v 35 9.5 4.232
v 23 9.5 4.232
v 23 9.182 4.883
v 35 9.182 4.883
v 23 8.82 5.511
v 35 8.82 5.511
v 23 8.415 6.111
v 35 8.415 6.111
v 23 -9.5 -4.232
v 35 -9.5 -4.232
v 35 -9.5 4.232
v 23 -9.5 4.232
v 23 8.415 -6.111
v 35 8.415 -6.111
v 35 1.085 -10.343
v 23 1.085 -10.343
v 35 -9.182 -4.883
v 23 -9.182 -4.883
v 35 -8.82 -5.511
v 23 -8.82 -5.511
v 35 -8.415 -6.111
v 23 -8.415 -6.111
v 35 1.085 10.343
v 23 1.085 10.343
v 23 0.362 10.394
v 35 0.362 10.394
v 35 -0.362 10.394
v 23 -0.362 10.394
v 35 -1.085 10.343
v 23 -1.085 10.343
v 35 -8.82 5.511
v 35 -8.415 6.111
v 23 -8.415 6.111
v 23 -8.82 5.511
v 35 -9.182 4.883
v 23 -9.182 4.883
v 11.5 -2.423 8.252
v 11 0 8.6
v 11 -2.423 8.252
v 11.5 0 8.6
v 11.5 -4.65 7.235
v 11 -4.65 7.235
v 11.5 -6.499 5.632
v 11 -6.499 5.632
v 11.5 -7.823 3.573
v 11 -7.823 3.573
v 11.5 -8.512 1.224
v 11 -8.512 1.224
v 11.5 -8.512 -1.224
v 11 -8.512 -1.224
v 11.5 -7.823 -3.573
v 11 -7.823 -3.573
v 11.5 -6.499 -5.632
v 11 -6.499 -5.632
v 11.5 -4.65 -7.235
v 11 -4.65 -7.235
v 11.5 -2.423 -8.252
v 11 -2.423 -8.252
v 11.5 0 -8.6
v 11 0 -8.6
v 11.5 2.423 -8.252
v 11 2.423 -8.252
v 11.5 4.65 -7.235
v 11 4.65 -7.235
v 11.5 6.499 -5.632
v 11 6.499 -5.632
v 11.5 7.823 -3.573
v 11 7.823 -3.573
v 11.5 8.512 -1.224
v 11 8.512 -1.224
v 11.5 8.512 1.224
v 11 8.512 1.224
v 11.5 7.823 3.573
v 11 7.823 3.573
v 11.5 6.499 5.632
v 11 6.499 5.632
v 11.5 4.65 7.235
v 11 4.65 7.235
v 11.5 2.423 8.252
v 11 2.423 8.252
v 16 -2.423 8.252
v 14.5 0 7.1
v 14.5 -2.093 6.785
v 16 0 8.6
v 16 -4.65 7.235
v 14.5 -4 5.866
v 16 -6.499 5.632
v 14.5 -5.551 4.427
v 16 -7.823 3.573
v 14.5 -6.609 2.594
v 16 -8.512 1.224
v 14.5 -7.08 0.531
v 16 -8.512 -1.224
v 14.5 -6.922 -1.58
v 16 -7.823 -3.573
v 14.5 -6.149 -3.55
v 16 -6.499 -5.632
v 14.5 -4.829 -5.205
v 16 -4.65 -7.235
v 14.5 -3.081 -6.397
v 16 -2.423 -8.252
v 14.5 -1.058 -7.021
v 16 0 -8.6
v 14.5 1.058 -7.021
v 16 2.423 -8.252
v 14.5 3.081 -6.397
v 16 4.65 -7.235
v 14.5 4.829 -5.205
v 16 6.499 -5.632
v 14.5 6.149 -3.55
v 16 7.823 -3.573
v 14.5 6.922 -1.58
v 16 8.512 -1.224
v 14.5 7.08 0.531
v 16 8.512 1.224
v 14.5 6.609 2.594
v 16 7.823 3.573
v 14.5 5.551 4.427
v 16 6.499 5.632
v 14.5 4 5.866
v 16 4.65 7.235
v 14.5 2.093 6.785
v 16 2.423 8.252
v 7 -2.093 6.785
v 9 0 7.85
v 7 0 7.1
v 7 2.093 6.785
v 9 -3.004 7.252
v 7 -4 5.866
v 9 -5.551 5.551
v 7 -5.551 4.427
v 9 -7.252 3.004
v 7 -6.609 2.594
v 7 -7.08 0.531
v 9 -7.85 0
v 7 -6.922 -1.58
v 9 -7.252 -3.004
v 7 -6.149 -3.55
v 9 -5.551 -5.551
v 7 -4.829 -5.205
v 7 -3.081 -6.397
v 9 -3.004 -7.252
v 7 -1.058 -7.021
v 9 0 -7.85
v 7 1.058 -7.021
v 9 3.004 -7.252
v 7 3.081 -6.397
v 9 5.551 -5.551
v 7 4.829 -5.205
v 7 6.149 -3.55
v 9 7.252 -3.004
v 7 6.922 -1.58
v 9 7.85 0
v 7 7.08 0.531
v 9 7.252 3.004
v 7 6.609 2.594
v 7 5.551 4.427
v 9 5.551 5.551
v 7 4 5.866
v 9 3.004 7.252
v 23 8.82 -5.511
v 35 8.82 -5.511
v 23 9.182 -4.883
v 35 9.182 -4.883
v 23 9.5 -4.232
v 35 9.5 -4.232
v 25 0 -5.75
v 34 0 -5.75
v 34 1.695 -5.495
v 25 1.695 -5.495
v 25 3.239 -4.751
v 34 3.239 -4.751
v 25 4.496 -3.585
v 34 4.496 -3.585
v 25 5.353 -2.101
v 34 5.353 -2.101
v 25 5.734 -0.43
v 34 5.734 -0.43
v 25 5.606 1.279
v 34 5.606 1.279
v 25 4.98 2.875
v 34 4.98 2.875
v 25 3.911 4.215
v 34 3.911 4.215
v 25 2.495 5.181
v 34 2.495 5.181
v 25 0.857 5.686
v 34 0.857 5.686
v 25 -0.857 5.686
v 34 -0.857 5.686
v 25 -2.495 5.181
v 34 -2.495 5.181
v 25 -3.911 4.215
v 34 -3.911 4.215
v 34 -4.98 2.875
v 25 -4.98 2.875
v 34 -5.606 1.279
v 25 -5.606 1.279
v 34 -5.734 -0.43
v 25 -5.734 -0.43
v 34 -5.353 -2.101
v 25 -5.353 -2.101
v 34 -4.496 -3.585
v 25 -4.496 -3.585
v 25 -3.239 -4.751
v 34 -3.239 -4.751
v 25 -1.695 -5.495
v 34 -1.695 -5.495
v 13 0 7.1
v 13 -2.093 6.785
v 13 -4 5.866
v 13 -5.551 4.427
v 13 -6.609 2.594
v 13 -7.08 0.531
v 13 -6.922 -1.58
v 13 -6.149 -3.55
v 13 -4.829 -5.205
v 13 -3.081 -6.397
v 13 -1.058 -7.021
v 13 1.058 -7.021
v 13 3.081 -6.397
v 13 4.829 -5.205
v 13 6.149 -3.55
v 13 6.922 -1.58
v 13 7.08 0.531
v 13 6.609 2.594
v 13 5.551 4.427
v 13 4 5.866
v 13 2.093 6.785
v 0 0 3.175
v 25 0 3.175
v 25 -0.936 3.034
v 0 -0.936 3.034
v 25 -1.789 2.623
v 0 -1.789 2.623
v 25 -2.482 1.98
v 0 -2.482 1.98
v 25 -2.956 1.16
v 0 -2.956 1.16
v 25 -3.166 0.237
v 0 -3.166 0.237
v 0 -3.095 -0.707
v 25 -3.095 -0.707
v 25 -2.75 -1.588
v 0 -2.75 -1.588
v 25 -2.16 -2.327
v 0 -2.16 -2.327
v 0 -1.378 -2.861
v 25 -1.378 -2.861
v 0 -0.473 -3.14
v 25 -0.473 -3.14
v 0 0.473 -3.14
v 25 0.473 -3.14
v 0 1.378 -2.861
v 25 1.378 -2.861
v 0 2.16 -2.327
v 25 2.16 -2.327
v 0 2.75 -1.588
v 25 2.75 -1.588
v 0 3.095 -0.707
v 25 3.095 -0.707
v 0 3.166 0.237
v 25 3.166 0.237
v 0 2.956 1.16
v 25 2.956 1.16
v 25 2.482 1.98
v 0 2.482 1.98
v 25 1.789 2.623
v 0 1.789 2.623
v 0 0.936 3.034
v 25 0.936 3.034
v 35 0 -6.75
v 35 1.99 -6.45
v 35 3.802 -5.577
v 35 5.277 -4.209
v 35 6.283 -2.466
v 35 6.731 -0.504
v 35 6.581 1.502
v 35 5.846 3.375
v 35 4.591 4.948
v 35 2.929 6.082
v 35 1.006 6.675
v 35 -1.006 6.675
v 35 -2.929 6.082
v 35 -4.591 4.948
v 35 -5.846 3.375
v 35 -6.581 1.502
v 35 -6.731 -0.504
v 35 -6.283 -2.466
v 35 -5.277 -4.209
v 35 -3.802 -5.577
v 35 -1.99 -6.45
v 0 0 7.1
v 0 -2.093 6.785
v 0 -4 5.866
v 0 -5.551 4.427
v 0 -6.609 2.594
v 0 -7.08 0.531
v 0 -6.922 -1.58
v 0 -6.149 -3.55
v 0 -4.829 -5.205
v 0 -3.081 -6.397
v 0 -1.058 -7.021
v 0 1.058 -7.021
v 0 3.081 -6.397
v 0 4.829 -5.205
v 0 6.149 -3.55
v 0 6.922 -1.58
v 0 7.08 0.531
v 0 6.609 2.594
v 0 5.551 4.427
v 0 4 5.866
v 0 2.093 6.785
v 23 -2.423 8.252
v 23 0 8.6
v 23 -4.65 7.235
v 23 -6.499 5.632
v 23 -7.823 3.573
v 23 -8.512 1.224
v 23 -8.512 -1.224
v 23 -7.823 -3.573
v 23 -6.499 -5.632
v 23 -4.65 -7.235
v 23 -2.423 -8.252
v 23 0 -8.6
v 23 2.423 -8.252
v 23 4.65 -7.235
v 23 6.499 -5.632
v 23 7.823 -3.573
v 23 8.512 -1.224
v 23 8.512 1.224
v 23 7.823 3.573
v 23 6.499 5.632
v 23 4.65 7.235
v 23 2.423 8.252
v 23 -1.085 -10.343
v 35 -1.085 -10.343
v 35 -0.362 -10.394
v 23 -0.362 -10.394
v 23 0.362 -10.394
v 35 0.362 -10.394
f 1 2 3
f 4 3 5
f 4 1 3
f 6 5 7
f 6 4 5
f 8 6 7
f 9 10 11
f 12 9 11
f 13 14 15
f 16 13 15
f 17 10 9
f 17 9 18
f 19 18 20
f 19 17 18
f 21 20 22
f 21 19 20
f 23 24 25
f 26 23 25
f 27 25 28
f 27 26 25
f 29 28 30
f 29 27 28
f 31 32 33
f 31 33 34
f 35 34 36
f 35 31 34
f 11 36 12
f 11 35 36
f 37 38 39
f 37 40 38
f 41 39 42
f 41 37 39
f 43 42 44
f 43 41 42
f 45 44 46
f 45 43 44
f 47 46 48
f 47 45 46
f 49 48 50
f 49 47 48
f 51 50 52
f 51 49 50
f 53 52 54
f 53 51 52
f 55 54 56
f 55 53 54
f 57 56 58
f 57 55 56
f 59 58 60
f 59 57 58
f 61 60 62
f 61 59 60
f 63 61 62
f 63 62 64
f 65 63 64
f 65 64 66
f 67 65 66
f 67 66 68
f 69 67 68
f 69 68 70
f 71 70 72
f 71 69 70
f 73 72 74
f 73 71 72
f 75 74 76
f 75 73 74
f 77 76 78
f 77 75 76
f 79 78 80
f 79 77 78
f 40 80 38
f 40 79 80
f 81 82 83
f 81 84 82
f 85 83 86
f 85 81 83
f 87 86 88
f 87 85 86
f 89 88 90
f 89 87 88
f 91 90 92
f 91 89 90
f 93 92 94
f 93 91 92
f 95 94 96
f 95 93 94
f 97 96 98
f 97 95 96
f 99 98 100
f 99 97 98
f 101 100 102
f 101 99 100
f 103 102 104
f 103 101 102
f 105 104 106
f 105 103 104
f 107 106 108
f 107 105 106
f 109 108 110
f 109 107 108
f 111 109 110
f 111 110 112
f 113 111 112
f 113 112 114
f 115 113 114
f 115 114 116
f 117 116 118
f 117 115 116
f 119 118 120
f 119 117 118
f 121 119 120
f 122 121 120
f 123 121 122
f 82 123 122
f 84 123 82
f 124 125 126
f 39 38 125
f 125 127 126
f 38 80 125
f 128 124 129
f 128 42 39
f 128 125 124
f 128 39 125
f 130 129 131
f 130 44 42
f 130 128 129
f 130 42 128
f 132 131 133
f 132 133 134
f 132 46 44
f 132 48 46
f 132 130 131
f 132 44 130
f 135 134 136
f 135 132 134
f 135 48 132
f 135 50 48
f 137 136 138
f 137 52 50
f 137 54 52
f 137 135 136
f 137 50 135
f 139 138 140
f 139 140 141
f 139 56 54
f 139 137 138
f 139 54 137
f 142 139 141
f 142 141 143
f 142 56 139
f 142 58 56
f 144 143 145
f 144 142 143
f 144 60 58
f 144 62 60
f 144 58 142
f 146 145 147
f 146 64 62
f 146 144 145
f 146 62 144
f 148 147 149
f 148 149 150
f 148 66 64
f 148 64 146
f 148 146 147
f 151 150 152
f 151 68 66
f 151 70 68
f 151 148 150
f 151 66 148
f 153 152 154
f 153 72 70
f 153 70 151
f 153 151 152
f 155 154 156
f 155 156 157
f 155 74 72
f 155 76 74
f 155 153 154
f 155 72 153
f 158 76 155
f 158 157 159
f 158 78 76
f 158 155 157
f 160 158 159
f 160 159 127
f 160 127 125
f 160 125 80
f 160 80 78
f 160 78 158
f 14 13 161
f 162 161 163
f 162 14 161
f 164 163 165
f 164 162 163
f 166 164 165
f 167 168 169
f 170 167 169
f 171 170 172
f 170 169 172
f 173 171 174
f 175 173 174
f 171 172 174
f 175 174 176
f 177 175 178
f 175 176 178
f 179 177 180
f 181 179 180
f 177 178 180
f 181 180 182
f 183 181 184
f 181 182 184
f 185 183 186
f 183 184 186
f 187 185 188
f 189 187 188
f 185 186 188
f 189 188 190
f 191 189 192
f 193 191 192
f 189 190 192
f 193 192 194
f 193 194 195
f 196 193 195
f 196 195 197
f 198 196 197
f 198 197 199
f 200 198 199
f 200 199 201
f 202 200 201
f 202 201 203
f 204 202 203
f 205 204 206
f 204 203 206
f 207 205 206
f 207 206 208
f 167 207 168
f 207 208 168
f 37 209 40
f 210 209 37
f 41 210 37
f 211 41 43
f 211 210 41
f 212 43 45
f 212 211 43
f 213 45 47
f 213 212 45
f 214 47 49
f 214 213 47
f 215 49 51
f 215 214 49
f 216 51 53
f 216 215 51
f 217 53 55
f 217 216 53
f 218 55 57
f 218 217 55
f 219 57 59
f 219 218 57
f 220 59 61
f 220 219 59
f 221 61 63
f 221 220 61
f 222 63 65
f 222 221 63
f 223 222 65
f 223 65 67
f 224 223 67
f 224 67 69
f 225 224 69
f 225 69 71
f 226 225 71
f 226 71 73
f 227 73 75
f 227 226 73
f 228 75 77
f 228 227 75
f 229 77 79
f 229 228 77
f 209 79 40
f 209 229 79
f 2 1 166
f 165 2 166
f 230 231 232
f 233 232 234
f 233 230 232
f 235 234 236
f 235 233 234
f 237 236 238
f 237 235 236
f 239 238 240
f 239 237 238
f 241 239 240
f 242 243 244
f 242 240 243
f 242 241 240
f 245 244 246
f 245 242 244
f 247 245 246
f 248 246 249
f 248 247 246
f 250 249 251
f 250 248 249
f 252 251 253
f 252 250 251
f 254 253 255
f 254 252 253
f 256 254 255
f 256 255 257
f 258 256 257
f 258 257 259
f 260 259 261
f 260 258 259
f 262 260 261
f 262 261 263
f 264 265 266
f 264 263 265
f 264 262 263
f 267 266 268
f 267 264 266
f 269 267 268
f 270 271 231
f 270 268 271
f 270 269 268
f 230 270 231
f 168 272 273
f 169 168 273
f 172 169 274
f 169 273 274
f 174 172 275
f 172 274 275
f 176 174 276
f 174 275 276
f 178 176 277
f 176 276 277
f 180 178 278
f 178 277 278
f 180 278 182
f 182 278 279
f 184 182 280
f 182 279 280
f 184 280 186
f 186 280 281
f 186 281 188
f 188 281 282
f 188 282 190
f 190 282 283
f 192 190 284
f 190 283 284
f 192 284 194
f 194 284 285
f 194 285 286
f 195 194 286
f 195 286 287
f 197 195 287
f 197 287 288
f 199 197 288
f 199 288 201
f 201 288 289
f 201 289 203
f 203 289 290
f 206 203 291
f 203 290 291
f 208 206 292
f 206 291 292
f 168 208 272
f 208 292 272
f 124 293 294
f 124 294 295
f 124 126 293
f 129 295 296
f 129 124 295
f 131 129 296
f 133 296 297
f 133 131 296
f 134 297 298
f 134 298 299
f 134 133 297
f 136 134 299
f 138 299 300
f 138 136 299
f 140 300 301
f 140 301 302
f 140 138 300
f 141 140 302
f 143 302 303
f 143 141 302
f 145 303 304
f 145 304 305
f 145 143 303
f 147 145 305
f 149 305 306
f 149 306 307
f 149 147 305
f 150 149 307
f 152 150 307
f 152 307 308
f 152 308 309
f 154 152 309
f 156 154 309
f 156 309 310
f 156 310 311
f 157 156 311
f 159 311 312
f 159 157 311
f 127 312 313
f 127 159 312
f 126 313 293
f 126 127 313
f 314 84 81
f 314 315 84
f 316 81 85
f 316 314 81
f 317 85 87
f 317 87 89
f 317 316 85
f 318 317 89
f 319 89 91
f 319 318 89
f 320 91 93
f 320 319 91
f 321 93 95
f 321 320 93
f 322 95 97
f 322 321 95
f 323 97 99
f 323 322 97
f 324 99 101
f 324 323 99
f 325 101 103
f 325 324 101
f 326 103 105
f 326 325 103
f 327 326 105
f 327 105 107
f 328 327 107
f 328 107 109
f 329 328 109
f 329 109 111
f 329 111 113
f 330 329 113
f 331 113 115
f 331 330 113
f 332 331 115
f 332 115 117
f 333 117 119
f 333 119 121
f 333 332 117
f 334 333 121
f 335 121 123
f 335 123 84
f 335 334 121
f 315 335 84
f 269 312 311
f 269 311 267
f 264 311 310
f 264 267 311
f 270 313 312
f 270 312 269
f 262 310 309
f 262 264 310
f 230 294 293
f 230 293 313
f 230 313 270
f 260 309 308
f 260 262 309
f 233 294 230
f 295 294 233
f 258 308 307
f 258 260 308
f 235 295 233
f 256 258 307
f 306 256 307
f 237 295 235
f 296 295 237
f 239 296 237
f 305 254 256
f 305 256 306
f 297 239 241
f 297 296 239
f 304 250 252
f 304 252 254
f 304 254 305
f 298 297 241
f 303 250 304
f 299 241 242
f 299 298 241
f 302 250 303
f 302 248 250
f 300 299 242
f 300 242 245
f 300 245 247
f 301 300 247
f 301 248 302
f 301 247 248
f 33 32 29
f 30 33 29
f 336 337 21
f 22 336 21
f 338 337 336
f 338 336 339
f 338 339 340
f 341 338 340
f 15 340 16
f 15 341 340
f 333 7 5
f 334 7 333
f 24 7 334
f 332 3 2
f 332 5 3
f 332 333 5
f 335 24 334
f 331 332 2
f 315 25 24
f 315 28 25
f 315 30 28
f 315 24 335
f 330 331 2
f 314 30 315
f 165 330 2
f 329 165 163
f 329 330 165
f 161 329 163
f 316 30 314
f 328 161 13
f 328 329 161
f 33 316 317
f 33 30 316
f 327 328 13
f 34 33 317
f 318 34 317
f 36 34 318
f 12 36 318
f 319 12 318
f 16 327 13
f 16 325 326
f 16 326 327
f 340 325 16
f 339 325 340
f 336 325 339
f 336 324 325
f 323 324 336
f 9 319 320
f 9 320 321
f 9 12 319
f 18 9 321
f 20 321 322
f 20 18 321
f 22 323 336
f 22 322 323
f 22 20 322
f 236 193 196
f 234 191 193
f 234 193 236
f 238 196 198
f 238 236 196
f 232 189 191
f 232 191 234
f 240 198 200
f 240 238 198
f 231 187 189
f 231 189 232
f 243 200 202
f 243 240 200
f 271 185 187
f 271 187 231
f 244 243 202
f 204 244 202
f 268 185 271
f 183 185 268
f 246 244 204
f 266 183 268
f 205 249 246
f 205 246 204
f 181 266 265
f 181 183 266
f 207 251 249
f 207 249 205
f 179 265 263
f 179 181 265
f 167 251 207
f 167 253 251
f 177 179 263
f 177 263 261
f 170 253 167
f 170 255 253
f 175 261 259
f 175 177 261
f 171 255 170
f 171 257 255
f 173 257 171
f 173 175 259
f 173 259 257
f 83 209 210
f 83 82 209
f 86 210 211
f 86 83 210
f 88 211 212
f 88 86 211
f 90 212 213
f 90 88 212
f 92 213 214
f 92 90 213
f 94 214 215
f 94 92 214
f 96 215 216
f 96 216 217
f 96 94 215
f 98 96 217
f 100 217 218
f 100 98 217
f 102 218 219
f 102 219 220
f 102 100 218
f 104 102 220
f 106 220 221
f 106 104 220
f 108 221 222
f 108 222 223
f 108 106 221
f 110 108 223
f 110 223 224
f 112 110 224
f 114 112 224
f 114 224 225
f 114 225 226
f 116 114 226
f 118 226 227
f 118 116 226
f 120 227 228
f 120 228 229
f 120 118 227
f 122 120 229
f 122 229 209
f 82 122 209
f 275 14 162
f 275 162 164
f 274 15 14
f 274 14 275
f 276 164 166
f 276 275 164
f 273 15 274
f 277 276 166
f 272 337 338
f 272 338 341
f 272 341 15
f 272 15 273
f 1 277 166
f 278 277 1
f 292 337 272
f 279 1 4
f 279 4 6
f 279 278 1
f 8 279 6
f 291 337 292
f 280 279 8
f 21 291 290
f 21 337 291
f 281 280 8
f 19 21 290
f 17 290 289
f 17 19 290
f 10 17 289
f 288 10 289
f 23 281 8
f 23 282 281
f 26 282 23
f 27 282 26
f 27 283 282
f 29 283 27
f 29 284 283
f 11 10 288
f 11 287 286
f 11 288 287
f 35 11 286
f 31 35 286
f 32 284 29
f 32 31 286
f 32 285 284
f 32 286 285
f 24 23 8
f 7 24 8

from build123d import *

# Parameters (mm, degrees)
CUT_EXTRUDE1_DEPTH       = 38.964720465
SCHIZZO1_R               = 5.75
TAGLIO_ESTRUSIONE1_DEPTH = 10
SMUSSO1_SIZE             = 1


with BuildPart() as part:
    # Sketch1 → Revolve1 (revolve)
    with BuildSketch(Plane.XY, mode=Mode.PRIVATE) as revolve1_sk:
        Polygon((0, -7.1), (7, -7.1), (11, -8.6), (11.5, -8.6), (13, -7.1), (14.5, -7.1), (16, -8.6), (23, -8.6), (23, -10.4), (35, -10.4), (35, -3.175), (0, -3.175), align=None)
    revolve(revolve1_sk.sketch.rotate(Axis((0, 0, 0), (1, 0, 0)), 270), axis=Axis((0, 0, 0), (1, 0, 0)))

    # Sketch2 → Cut-Extrude1 (cut, through all)
    with BuildSketch(Plane(origin=(35, 0, 0), x_dir=(0, 0, -1), z_dir=(1, 0, 0))):
        with BuildLine():
            Line((-10.343251733, 1.084962483), (-6.111230939, 8.415037517))
            ThreePointArc((-6.111230939, 8.415037517), (-9.006664199, 5.2), (-10.343251733, 1.084962483))
        make_face()
        with BuildLine():
            ThreePointArc((4.232020794, 9.5), (0, 10.4), (-4.232020794, 9.5))
            Line((-4.232020794, 9.5), (4.232020794, 9.5))
        make_face()
        with BuildLine():
            Line((-6.111230939, -8.415037517), (-10.343251733, -1.084962483))
            ThreePointArc((-10.343251733, -1.084962483), (-9.006664199, -5.2), (-6.111230939, -8.415037517))
        make_face()
        with BuildLine():
            ThreePointArc((10.343251733, 1.084962483), (9.006664199, 5.2), (6.111230939, 8.415037517))
            Line((6.111230939, 8.415037517), (10.343251733, 1.084962483))
        make_face()
        with BuildLine():
            Line((4.232020794, -9.5), (-4.232020794, -9.5))
            ThreePointArc((-4.232020794, -9.5), (0, -10.4), (4.232020794, -9.5))
        make_face()
        with BuildLine():
            ThreePointArc((6.111230939, -8.415037517), (9.006664199, -5.2), (10.343251733, -1.084962483))
            Line((10.343251733, -1.084962483), (6.111230939, -8.415037517))
        make_face()
    extrude(amount=-CUT_EXTRUDE1_DEPTH, mode=Mode.SUBTRACT)

    # Schizzo1 → Taglio-Estrusione1 (cut)
    with BuildSketch(Plane(origin=(35, 0, 0), x_dir=(0, 0, -1), z_dir=(1, 0, 0))):
        Circle(SCHIZZO1_R)
    extrude(amount=-TAGLIO_ESTRUSIONE1_DEPTH, mode=Mode.SUBTRACT)

    # Smusso1
    smusso1_edges = [part.edges().sort_by_distance(p)[0] for p in [
        (35, 0, 5.75),
    ]]
    chamfer(smusso1_edges, length=SMUSSO1_SIZE)


solid = part.part
